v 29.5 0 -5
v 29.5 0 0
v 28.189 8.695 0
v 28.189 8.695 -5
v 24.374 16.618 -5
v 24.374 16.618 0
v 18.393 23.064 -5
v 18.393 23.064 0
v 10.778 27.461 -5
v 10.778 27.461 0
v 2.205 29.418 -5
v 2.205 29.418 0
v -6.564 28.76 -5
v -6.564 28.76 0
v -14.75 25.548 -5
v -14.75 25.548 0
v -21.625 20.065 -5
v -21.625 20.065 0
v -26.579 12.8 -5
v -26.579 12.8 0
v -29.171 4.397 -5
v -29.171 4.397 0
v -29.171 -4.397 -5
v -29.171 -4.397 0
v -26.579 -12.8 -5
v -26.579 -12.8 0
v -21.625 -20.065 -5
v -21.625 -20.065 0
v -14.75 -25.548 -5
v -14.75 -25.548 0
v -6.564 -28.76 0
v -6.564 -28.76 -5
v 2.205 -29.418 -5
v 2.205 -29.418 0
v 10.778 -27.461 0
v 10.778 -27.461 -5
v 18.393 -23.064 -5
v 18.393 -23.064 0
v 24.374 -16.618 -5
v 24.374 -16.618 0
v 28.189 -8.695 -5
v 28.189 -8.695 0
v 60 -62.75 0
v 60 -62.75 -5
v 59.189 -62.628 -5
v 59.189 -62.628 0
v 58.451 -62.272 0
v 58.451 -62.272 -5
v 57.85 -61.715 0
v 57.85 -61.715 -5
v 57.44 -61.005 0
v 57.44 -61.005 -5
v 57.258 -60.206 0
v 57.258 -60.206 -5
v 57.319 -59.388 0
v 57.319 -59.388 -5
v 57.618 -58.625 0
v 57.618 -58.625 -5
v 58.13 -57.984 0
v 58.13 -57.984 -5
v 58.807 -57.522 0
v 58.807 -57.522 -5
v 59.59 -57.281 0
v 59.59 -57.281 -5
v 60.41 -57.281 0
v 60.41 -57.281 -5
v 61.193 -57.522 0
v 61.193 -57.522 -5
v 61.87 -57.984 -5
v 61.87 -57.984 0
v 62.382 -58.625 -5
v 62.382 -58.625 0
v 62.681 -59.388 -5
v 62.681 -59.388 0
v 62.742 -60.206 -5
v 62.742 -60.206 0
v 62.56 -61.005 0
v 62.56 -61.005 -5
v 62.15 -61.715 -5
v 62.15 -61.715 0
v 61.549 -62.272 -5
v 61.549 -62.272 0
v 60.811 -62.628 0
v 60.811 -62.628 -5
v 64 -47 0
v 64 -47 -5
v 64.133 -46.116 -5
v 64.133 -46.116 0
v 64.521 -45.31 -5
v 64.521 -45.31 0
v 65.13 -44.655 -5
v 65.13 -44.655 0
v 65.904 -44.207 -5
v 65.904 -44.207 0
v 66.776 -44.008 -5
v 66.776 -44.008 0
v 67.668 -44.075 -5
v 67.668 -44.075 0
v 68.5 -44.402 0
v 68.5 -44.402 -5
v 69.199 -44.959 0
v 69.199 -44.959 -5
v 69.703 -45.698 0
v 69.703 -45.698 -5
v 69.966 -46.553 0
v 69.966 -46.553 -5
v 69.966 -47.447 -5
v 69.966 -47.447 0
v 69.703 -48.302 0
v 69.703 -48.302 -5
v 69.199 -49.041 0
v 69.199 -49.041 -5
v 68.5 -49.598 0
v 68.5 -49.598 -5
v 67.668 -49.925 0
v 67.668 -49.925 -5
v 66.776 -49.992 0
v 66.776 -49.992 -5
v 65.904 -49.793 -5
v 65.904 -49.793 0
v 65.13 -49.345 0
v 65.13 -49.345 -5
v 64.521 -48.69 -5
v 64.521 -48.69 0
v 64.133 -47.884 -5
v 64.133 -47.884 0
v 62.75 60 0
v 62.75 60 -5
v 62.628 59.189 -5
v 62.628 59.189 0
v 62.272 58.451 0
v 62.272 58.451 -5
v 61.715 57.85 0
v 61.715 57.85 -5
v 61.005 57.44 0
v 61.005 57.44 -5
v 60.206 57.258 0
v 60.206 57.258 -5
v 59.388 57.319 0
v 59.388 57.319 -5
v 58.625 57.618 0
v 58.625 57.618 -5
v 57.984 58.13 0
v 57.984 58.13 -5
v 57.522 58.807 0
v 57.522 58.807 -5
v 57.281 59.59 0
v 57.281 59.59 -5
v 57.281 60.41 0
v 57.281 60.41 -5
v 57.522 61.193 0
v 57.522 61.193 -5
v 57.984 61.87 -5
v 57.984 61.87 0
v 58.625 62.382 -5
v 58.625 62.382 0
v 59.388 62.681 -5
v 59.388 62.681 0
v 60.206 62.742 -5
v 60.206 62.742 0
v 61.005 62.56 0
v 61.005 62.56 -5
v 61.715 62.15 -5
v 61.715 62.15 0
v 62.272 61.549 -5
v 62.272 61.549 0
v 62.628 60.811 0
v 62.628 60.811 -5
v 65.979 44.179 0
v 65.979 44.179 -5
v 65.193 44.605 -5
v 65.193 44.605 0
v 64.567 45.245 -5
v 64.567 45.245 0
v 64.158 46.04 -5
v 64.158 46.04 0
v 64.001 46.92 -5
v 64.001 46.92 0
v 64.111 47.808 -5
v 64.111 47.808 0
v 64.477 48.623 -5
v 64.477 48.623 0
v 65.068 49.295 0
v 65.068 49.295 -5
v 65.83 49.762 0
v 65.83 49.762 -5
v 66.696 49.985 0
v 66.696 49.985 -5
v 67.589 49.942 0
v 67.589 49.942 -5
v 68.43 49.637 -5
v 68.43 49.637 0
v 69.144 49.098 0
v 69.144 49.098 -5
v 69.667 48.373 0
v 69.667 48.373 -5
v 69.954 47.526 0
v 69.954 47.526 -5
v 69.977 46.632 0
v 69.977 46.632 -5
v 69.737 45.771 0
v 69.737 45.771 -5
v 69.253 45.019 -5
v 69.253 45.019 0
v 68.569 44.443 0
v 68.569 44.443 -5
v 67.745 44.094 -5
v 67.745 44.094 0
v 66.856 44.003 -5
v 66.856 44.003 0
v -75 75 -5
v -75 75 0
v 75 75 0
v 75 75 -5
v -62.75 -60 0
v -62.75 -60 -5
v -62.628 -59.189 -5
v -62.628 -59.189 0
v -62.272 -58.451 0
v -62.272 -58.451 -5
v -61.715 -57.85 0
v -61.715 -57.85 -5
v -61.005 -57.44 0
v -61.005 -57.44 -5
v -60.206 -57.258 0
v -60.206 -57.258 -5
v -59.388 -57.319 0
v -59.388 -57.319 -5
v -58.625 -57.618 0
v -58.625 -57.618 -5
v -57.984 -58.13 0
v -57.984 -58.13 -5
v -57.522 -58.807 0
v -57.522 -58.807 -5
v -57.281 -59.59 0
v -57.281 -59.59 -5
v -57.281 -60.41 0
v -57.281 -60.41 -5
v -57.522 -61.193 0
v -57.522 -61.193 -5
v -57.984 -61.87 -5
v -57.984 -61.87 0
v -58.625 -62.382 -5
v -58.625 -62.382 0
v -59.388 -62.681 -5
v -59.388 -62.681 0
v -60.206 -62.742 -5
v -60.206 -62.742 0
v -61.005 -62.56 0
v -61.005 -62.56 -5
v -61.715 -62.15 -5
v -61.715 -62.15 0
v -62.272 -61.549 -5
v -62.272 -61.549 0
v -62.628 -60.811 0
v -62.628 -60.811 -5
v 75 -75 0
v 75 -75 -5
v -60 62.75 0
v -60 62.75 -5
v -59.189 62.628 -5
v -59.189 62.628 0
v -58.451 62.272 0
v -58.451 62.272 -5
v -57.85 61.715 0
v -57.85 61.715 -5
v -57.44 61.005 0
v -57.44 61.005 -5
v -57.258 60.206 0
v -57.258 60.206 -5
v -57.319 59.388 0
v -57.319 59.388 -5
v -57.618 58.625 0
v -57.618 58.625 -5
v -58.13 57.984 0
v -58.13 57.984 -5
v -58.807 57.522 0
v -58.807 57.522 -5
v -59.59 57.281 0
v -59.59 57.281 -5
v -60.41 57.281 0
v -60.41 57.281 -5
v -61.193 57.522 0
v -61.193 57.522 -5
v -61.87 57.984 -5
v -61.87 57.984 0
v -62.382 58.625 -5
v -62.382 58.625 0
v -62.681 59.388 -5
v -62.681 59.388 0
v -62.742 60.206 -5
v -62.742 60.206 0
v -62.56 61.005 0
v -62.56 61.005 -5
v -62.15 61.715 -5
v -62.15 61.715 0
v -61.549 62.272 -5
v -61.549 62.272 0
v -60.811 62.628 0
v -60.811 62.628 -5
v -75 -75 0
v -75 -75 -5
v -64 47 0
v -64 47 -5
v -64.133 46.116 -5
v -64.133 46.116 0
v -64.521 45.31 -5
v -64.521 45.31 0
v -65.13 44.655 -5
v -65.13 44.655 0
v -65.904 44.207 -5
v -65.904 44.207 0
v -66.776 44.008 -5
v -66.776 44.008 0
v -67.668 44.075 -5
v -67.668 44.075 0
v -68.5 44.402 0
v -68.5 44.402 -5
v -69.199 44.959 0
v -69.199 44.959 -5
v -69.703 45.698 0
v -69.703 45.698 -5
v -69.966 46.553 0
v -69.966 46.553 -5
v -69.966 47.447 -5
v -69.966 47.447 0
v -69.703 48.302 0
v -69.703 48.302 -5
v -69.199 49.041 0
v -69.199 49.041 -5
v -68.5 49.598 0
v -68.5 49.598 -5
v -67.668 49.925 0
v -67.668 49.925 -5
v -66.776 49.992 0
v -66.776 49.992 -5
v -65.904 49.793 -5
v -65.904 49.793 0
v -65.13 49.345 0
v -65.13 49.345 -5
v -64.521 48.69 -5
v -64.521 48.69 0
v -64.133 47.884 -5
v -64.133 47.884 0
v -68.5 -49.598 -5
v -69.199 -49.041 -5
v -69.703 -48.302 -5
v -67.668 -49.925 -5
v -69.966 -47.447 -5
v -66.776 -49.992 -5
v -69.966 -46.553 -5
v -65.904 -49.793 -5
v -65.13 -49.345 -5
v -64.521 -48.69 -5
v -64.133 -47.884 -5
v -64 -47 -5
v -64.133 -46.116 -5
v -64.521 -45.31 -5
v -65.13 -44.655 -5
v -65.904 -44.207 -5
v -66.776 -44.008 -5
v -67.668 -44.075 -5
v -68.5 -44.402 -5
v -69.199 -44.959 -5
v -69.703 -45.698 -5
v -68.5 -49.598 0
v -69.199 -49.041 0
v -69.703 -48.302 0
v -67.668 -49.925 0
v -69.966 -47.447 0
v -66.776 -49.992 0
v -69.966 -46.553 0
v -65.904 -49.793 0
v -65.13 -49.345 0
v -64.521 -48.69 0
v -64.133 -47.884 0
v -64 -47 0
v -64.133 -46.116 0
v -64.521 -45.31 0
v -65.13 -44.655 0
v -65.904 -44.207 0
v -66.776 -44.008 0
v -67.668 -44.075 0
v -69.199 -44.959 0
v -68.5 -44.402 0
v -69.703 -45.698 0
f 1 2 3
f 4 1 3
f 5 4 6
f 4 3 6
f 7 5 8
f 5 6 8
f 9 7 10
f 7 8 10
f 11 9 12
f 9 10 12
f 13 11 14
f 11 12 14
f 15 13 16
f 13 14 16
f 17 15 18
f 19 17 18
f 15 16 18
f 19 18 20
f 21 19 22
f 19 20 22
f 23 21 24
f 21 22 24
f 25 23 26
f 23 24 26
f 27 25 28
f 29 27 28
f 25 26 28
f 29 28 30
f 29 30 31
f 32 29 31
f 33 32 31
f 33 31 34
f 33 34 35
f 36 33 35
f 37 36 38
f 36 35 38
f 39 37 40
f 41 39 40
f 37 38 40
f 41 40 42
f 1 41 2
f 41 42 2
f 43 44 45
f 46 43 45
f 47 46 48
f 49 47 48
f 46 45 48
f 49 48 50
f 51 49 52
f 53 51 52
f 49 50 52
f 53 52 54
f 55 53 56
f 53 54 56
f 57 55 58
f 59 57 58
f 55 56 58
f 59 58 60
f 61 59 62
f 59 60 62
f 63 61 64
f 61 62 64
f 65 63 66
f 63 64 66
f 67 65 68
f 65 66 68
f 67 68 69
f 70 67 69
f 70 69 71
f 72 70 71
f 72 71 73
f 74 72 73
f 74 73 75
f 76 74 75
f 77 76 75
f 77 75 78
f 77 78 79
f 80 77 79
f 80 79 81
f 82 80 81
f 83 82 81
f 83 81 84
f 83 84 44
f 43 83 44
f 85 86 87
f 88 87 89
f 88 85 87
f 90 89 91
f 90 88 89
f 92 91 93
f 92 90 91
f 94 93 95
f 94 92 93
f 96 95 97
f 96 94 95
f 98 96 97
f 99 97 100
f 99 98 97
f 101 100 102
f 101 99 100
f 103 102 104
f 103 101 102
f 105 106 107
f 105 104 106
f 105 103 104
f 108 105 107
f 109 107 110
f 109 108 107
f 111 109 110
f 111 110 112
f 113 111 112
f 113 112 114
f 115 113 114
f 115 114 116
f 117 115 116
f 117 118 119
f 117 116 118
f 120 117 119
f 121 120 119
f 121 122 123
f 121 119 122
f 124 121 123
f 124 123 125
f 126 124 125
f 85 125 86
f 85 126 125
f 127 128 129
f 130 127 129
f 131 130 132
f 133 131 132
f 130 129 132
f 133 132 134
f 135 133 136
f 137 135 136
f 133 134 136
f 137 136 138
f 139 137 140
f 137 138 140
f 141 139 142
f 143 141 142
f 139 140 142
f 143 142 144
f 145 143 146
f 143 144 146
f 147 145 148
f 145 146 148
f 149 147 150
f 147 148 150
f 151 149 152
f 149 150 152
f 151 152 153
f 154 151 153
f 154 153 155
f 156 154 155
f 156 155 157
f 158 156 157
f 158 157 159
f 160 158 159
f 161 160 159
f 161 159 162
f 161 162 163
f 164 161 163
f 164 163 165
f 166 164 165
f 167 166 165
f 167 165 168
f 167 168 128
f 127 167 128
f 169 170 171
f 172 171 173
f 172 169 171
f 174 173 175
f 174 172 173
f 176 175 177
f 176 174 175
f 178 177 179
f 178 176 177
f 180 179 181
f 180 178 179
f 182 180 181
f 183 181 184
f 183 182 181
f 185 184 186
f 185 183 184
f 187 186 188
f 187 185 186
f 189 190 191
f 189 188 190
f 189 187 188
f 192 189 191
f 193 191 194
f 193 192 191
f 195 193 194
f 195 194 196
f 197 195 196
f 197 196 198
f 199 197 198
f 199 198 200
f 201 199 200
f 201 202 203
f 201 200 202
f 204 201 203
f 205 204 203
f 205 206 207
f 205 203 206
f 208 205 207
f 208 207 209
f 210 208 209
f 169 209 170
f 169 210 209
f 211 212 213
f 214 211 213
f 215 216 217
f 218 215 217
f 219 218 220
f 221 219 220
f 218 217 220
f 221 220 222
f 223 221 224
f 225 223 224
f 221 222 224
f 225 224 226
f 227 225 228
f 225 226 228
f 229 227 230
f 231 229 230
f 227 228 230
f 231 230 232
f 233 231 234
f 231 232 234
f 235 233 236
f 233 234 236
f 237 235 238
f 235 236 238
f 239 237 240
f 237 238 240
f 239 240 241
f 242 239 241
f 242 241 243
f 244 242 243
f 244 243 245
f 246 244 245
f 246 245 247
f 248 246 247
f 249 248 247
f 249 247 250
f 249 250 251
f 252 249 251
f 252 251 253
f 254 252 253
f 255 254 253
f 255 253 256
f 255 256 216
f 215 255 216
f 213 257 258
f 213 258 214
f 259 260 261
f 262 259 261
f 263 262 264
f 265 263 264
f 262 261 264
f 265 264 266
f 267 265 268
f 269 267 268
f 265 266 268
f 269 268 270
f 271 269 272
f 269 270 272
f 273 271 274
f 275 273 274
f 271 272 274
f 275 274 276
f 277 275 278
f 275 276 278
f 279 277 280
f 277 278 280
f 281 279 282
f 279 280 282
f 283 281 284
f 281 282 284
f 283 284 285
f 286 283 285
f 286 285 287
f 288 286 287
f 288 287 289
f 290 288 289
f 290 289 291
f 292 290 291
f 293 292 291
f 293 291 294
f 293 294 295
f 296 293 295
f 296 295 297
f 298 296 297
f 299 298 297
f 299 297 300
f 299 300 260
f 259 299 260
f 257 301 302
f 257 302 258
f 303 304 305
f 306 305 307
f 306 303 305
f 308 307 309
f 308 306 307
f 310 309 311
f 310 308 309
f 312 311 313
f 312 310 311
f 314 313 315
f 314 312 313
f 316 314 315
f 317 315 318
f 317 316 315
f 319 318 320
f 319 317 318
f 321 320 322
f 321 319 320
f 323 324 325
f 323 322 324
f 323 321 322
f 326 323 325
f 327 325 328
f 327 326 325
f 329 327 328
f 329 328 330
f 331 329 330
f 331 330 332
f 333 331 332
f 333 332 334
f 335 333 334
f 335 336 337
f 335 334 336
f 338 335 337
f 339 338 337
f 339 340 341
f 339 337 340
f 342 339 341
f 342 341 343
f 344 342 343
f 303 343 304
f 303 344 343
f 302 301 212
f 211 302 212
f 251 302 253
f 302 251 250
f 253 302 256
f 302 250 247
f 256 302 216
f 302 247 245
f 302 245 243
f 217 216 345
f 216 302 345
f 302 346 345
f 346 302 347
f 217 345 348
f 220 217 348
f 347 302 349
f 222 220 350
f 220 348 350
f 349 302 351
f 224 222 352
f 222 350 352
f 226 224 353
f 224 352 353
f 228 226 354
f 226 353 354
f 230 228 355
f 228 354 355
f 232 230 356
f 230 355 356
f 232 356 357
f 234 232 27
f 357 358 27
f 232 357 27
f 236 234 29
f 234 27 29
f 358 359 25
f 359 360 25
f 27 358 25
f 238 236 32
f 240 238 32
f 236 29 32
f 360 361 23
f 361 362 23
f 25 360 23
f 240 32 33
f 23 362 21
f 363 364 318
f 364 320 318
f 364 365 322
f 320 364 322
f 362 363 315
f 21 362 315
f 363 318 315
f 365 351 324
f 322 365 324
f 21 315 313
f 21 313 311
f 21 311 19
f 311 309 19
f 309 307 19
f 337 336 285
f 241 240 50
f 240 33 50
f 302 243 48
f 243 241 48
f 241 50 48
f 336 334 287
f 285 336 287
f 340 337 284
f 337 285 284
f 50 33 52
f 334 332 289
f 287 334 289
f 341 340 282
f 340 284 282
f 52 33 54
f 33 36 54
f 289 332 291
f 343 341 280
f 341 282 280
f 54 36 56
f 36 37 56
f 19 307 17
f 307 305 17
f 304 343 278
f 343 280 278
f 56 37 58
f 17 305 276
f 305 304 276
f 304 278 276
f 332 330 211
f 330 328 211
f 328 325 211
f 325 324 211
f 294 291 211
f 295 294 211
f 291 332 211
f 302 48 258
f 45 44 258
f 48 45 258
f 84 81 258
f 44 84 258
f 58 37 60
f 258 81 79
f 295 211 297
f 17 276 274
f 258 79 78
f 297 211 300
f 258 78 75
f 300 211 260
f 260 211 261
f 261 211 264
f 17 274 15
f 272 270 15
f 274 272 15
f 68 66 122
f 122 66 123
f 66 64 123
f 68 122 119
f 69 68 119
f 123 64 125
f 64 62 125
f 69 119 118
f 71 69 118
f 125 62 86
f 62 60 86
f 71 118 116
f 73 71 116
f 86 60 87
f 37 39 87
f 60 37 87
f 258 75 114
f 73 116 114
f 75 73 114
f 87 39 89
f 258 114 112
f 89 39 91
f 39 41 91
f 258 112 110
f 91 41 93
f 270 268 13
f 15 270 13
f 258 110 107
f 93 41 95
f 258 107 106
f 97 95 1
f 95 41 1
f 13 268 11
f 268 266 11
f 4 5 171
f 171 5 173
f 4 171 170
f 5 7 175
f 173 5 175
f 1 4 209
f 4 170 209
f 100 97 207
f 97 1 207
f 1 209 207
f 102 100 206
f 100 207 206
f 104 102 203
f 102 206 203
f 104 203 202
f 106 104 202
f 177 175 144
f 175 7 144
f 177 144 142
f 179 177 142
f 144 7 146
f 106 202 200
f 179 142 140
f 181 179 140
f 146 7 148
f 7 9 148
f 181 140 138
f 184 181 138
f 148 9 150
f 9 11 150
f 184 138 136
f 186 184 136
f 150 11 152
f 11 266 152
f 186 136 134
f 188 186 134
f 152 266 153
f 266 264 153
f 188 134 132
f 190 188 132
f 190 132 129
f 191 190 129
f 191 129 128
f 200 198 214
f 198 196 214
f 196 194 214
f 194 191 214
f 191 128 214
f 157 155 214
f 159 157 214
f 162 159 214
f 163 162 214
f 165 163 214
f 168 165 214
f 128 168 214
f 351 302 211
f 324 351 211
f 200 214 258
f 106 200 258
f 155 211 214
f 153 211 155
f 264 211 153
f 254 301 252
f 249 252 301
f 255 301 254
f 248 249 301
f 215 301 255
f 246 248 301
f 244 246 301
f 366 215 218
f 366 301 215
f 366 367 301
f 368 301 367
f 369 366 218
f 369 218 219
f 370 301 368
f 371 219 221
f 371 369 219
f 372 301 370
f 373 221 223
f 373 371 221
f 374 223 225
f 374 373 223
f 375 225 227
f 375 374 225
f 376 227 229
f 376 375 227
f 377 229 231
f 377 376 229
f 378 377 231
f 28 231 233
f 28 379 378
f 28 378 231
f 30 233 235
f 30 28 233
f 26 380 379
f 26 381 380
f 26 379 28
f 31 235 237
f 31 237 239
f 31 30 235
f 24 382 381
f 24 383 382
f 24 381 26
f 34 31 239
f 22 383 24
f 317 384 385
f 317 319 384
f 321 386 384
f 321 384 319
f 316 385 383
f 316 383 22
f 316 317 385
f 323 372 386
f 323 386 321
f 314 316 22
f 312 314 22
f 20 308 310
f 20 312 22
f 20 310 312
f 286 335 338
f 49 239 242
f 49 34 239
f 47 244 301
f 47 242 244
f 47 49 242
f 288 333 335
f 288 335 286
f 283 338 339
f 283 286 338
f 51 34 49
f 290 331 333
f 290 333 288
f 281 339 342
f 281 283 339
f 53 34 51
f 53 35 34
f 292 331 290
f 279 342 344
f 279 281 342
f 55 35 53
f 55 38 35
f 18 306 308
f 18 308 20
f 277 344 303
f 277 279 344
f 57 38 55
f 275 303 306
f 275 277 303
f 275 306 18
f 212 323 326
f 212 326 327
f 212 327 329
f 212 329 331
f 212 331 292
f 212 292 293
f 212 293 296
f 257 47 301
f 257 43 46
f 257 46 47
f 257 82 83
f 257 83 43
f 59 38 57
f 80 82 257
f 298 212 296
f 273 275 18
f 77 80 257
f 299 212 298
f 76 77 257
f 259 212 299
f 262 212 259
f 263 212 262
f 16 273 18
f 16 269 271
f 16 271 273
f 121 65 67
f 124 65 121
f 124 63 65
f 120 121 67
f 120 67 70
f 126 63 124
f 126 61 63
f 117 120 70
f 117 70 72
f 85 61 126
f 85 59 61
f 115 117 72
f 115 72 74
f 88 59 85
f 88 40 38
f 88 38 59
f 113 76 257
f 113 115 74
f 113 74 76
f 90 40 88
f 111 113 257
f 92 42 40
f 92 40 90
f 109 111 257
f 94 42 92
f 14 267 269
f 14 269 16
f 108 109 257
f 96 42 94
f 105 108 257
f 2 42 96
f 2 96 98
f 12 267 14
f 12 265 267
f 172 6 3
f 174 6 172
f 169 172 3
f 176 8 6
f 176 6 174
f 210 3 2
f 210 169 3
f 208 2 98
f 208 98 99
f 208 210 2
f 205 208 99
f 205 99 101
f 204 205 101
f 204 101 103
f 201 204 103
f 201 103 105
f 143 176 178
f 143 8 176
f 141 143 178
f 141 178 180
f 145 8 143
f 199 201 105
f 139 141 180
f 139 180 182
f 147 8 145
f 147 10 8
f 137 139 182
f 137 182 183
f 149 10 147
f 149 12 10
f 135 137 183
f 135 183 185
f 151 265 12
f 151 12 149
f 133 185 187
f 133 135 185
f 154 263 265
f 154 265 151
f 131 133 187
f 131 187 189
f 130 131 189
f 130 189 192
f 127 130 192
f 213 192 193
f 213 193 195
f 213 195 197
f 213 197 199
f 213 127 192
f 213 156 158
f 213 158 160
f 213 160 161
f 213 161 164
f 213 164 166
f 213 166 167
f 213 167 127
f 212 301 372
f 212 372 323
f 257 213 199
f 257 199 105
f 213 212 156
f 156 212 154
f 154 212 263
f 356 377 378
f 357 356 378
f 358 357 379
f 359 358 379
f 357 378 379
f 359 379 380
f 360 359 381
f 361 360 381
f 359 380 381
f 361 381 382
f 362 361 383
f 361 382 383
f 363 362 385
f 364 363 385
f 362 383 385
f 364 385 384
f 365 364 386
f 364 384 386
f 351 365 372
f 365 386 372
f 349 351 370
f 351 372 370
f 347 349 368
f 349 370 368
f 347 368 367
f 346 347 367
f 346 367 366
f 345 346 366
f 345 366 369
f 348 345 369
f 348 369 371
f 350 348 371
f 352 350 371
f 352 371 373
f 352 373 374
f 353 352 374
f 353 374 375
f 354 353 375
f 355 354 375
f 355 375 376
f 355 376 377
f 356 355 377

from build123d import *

# Parameters (mm, degrees)
F2_W            = 150
F2_H            = 150
F2_R            = 29.5
F3_DEPTH        = 5
F5_D            = 5.5
F5_COPIES_COUNT = 4
F6_R            = 3
F7_DEPTH        = 5.001


# Not quite as in the source:
# - a pattern or mirror of a feature is missing from the dataset's text; its kind, count and spacing are read off the source's solid
# - a feature names something its author has since deleted; it is built from what else it names


with BuildPart() as f3:
    # F2 (on Top) → F3 (new body)
    with BuildSketch(Plane.XY):
        Rectangle(F2_W, F2_H)
        Circle(F2_R, mode=Mode.SUBTRACT)
    extrude(amount=-F3_DEPTH)

    # F5 (through all)
    with Locations(Plane.XY):
        with Locations((-60, -60)):
            f5 = Hole(F5_D / 2)

    # F5_copies: F5 ×4 about axis
    f5_copies_axis = Axis((0, 0, 0), (0, 0, 1))
    for i in range(1, F5_COPIES_COUNT):
        add(f5.rotate(f5_copies_axis, i * 360 / F5_COPIES_COUNT), mode=Mode.SUBTRACT)

    # F6 (on Top) → F7 (cut, through all)
    with BuildSketch(Plane.XY):
        with Locations((-67, -47)):
            Circle(F6_R)
    f7 = extrude(amount=-F7_DEPTH, mode=Mode.SUBTRACT)

    # F7_copies: F7 across plane
    add(f7.mirror(Plane(origin=(0, 0, 0), x_dir=(0, 0, 1), z_dir=(1, 0, 0))), mode=Mode.SUBTRACT)

    # F7_copies1: F7 across plane
    add(f7.mirror(Plane.ZX), mode=Mode.SUBTRACT)

    # F7_copies2: F7 across plane
    add(f7.mirror(Plane(origin=(0, 0, 0), x_dir=(-0.5742821086, 0.818657474, 0), z_dir=(0.818657474, 0.5742821086, 0))), mode=Mode.SUBTRACT)


solid = f3.part
